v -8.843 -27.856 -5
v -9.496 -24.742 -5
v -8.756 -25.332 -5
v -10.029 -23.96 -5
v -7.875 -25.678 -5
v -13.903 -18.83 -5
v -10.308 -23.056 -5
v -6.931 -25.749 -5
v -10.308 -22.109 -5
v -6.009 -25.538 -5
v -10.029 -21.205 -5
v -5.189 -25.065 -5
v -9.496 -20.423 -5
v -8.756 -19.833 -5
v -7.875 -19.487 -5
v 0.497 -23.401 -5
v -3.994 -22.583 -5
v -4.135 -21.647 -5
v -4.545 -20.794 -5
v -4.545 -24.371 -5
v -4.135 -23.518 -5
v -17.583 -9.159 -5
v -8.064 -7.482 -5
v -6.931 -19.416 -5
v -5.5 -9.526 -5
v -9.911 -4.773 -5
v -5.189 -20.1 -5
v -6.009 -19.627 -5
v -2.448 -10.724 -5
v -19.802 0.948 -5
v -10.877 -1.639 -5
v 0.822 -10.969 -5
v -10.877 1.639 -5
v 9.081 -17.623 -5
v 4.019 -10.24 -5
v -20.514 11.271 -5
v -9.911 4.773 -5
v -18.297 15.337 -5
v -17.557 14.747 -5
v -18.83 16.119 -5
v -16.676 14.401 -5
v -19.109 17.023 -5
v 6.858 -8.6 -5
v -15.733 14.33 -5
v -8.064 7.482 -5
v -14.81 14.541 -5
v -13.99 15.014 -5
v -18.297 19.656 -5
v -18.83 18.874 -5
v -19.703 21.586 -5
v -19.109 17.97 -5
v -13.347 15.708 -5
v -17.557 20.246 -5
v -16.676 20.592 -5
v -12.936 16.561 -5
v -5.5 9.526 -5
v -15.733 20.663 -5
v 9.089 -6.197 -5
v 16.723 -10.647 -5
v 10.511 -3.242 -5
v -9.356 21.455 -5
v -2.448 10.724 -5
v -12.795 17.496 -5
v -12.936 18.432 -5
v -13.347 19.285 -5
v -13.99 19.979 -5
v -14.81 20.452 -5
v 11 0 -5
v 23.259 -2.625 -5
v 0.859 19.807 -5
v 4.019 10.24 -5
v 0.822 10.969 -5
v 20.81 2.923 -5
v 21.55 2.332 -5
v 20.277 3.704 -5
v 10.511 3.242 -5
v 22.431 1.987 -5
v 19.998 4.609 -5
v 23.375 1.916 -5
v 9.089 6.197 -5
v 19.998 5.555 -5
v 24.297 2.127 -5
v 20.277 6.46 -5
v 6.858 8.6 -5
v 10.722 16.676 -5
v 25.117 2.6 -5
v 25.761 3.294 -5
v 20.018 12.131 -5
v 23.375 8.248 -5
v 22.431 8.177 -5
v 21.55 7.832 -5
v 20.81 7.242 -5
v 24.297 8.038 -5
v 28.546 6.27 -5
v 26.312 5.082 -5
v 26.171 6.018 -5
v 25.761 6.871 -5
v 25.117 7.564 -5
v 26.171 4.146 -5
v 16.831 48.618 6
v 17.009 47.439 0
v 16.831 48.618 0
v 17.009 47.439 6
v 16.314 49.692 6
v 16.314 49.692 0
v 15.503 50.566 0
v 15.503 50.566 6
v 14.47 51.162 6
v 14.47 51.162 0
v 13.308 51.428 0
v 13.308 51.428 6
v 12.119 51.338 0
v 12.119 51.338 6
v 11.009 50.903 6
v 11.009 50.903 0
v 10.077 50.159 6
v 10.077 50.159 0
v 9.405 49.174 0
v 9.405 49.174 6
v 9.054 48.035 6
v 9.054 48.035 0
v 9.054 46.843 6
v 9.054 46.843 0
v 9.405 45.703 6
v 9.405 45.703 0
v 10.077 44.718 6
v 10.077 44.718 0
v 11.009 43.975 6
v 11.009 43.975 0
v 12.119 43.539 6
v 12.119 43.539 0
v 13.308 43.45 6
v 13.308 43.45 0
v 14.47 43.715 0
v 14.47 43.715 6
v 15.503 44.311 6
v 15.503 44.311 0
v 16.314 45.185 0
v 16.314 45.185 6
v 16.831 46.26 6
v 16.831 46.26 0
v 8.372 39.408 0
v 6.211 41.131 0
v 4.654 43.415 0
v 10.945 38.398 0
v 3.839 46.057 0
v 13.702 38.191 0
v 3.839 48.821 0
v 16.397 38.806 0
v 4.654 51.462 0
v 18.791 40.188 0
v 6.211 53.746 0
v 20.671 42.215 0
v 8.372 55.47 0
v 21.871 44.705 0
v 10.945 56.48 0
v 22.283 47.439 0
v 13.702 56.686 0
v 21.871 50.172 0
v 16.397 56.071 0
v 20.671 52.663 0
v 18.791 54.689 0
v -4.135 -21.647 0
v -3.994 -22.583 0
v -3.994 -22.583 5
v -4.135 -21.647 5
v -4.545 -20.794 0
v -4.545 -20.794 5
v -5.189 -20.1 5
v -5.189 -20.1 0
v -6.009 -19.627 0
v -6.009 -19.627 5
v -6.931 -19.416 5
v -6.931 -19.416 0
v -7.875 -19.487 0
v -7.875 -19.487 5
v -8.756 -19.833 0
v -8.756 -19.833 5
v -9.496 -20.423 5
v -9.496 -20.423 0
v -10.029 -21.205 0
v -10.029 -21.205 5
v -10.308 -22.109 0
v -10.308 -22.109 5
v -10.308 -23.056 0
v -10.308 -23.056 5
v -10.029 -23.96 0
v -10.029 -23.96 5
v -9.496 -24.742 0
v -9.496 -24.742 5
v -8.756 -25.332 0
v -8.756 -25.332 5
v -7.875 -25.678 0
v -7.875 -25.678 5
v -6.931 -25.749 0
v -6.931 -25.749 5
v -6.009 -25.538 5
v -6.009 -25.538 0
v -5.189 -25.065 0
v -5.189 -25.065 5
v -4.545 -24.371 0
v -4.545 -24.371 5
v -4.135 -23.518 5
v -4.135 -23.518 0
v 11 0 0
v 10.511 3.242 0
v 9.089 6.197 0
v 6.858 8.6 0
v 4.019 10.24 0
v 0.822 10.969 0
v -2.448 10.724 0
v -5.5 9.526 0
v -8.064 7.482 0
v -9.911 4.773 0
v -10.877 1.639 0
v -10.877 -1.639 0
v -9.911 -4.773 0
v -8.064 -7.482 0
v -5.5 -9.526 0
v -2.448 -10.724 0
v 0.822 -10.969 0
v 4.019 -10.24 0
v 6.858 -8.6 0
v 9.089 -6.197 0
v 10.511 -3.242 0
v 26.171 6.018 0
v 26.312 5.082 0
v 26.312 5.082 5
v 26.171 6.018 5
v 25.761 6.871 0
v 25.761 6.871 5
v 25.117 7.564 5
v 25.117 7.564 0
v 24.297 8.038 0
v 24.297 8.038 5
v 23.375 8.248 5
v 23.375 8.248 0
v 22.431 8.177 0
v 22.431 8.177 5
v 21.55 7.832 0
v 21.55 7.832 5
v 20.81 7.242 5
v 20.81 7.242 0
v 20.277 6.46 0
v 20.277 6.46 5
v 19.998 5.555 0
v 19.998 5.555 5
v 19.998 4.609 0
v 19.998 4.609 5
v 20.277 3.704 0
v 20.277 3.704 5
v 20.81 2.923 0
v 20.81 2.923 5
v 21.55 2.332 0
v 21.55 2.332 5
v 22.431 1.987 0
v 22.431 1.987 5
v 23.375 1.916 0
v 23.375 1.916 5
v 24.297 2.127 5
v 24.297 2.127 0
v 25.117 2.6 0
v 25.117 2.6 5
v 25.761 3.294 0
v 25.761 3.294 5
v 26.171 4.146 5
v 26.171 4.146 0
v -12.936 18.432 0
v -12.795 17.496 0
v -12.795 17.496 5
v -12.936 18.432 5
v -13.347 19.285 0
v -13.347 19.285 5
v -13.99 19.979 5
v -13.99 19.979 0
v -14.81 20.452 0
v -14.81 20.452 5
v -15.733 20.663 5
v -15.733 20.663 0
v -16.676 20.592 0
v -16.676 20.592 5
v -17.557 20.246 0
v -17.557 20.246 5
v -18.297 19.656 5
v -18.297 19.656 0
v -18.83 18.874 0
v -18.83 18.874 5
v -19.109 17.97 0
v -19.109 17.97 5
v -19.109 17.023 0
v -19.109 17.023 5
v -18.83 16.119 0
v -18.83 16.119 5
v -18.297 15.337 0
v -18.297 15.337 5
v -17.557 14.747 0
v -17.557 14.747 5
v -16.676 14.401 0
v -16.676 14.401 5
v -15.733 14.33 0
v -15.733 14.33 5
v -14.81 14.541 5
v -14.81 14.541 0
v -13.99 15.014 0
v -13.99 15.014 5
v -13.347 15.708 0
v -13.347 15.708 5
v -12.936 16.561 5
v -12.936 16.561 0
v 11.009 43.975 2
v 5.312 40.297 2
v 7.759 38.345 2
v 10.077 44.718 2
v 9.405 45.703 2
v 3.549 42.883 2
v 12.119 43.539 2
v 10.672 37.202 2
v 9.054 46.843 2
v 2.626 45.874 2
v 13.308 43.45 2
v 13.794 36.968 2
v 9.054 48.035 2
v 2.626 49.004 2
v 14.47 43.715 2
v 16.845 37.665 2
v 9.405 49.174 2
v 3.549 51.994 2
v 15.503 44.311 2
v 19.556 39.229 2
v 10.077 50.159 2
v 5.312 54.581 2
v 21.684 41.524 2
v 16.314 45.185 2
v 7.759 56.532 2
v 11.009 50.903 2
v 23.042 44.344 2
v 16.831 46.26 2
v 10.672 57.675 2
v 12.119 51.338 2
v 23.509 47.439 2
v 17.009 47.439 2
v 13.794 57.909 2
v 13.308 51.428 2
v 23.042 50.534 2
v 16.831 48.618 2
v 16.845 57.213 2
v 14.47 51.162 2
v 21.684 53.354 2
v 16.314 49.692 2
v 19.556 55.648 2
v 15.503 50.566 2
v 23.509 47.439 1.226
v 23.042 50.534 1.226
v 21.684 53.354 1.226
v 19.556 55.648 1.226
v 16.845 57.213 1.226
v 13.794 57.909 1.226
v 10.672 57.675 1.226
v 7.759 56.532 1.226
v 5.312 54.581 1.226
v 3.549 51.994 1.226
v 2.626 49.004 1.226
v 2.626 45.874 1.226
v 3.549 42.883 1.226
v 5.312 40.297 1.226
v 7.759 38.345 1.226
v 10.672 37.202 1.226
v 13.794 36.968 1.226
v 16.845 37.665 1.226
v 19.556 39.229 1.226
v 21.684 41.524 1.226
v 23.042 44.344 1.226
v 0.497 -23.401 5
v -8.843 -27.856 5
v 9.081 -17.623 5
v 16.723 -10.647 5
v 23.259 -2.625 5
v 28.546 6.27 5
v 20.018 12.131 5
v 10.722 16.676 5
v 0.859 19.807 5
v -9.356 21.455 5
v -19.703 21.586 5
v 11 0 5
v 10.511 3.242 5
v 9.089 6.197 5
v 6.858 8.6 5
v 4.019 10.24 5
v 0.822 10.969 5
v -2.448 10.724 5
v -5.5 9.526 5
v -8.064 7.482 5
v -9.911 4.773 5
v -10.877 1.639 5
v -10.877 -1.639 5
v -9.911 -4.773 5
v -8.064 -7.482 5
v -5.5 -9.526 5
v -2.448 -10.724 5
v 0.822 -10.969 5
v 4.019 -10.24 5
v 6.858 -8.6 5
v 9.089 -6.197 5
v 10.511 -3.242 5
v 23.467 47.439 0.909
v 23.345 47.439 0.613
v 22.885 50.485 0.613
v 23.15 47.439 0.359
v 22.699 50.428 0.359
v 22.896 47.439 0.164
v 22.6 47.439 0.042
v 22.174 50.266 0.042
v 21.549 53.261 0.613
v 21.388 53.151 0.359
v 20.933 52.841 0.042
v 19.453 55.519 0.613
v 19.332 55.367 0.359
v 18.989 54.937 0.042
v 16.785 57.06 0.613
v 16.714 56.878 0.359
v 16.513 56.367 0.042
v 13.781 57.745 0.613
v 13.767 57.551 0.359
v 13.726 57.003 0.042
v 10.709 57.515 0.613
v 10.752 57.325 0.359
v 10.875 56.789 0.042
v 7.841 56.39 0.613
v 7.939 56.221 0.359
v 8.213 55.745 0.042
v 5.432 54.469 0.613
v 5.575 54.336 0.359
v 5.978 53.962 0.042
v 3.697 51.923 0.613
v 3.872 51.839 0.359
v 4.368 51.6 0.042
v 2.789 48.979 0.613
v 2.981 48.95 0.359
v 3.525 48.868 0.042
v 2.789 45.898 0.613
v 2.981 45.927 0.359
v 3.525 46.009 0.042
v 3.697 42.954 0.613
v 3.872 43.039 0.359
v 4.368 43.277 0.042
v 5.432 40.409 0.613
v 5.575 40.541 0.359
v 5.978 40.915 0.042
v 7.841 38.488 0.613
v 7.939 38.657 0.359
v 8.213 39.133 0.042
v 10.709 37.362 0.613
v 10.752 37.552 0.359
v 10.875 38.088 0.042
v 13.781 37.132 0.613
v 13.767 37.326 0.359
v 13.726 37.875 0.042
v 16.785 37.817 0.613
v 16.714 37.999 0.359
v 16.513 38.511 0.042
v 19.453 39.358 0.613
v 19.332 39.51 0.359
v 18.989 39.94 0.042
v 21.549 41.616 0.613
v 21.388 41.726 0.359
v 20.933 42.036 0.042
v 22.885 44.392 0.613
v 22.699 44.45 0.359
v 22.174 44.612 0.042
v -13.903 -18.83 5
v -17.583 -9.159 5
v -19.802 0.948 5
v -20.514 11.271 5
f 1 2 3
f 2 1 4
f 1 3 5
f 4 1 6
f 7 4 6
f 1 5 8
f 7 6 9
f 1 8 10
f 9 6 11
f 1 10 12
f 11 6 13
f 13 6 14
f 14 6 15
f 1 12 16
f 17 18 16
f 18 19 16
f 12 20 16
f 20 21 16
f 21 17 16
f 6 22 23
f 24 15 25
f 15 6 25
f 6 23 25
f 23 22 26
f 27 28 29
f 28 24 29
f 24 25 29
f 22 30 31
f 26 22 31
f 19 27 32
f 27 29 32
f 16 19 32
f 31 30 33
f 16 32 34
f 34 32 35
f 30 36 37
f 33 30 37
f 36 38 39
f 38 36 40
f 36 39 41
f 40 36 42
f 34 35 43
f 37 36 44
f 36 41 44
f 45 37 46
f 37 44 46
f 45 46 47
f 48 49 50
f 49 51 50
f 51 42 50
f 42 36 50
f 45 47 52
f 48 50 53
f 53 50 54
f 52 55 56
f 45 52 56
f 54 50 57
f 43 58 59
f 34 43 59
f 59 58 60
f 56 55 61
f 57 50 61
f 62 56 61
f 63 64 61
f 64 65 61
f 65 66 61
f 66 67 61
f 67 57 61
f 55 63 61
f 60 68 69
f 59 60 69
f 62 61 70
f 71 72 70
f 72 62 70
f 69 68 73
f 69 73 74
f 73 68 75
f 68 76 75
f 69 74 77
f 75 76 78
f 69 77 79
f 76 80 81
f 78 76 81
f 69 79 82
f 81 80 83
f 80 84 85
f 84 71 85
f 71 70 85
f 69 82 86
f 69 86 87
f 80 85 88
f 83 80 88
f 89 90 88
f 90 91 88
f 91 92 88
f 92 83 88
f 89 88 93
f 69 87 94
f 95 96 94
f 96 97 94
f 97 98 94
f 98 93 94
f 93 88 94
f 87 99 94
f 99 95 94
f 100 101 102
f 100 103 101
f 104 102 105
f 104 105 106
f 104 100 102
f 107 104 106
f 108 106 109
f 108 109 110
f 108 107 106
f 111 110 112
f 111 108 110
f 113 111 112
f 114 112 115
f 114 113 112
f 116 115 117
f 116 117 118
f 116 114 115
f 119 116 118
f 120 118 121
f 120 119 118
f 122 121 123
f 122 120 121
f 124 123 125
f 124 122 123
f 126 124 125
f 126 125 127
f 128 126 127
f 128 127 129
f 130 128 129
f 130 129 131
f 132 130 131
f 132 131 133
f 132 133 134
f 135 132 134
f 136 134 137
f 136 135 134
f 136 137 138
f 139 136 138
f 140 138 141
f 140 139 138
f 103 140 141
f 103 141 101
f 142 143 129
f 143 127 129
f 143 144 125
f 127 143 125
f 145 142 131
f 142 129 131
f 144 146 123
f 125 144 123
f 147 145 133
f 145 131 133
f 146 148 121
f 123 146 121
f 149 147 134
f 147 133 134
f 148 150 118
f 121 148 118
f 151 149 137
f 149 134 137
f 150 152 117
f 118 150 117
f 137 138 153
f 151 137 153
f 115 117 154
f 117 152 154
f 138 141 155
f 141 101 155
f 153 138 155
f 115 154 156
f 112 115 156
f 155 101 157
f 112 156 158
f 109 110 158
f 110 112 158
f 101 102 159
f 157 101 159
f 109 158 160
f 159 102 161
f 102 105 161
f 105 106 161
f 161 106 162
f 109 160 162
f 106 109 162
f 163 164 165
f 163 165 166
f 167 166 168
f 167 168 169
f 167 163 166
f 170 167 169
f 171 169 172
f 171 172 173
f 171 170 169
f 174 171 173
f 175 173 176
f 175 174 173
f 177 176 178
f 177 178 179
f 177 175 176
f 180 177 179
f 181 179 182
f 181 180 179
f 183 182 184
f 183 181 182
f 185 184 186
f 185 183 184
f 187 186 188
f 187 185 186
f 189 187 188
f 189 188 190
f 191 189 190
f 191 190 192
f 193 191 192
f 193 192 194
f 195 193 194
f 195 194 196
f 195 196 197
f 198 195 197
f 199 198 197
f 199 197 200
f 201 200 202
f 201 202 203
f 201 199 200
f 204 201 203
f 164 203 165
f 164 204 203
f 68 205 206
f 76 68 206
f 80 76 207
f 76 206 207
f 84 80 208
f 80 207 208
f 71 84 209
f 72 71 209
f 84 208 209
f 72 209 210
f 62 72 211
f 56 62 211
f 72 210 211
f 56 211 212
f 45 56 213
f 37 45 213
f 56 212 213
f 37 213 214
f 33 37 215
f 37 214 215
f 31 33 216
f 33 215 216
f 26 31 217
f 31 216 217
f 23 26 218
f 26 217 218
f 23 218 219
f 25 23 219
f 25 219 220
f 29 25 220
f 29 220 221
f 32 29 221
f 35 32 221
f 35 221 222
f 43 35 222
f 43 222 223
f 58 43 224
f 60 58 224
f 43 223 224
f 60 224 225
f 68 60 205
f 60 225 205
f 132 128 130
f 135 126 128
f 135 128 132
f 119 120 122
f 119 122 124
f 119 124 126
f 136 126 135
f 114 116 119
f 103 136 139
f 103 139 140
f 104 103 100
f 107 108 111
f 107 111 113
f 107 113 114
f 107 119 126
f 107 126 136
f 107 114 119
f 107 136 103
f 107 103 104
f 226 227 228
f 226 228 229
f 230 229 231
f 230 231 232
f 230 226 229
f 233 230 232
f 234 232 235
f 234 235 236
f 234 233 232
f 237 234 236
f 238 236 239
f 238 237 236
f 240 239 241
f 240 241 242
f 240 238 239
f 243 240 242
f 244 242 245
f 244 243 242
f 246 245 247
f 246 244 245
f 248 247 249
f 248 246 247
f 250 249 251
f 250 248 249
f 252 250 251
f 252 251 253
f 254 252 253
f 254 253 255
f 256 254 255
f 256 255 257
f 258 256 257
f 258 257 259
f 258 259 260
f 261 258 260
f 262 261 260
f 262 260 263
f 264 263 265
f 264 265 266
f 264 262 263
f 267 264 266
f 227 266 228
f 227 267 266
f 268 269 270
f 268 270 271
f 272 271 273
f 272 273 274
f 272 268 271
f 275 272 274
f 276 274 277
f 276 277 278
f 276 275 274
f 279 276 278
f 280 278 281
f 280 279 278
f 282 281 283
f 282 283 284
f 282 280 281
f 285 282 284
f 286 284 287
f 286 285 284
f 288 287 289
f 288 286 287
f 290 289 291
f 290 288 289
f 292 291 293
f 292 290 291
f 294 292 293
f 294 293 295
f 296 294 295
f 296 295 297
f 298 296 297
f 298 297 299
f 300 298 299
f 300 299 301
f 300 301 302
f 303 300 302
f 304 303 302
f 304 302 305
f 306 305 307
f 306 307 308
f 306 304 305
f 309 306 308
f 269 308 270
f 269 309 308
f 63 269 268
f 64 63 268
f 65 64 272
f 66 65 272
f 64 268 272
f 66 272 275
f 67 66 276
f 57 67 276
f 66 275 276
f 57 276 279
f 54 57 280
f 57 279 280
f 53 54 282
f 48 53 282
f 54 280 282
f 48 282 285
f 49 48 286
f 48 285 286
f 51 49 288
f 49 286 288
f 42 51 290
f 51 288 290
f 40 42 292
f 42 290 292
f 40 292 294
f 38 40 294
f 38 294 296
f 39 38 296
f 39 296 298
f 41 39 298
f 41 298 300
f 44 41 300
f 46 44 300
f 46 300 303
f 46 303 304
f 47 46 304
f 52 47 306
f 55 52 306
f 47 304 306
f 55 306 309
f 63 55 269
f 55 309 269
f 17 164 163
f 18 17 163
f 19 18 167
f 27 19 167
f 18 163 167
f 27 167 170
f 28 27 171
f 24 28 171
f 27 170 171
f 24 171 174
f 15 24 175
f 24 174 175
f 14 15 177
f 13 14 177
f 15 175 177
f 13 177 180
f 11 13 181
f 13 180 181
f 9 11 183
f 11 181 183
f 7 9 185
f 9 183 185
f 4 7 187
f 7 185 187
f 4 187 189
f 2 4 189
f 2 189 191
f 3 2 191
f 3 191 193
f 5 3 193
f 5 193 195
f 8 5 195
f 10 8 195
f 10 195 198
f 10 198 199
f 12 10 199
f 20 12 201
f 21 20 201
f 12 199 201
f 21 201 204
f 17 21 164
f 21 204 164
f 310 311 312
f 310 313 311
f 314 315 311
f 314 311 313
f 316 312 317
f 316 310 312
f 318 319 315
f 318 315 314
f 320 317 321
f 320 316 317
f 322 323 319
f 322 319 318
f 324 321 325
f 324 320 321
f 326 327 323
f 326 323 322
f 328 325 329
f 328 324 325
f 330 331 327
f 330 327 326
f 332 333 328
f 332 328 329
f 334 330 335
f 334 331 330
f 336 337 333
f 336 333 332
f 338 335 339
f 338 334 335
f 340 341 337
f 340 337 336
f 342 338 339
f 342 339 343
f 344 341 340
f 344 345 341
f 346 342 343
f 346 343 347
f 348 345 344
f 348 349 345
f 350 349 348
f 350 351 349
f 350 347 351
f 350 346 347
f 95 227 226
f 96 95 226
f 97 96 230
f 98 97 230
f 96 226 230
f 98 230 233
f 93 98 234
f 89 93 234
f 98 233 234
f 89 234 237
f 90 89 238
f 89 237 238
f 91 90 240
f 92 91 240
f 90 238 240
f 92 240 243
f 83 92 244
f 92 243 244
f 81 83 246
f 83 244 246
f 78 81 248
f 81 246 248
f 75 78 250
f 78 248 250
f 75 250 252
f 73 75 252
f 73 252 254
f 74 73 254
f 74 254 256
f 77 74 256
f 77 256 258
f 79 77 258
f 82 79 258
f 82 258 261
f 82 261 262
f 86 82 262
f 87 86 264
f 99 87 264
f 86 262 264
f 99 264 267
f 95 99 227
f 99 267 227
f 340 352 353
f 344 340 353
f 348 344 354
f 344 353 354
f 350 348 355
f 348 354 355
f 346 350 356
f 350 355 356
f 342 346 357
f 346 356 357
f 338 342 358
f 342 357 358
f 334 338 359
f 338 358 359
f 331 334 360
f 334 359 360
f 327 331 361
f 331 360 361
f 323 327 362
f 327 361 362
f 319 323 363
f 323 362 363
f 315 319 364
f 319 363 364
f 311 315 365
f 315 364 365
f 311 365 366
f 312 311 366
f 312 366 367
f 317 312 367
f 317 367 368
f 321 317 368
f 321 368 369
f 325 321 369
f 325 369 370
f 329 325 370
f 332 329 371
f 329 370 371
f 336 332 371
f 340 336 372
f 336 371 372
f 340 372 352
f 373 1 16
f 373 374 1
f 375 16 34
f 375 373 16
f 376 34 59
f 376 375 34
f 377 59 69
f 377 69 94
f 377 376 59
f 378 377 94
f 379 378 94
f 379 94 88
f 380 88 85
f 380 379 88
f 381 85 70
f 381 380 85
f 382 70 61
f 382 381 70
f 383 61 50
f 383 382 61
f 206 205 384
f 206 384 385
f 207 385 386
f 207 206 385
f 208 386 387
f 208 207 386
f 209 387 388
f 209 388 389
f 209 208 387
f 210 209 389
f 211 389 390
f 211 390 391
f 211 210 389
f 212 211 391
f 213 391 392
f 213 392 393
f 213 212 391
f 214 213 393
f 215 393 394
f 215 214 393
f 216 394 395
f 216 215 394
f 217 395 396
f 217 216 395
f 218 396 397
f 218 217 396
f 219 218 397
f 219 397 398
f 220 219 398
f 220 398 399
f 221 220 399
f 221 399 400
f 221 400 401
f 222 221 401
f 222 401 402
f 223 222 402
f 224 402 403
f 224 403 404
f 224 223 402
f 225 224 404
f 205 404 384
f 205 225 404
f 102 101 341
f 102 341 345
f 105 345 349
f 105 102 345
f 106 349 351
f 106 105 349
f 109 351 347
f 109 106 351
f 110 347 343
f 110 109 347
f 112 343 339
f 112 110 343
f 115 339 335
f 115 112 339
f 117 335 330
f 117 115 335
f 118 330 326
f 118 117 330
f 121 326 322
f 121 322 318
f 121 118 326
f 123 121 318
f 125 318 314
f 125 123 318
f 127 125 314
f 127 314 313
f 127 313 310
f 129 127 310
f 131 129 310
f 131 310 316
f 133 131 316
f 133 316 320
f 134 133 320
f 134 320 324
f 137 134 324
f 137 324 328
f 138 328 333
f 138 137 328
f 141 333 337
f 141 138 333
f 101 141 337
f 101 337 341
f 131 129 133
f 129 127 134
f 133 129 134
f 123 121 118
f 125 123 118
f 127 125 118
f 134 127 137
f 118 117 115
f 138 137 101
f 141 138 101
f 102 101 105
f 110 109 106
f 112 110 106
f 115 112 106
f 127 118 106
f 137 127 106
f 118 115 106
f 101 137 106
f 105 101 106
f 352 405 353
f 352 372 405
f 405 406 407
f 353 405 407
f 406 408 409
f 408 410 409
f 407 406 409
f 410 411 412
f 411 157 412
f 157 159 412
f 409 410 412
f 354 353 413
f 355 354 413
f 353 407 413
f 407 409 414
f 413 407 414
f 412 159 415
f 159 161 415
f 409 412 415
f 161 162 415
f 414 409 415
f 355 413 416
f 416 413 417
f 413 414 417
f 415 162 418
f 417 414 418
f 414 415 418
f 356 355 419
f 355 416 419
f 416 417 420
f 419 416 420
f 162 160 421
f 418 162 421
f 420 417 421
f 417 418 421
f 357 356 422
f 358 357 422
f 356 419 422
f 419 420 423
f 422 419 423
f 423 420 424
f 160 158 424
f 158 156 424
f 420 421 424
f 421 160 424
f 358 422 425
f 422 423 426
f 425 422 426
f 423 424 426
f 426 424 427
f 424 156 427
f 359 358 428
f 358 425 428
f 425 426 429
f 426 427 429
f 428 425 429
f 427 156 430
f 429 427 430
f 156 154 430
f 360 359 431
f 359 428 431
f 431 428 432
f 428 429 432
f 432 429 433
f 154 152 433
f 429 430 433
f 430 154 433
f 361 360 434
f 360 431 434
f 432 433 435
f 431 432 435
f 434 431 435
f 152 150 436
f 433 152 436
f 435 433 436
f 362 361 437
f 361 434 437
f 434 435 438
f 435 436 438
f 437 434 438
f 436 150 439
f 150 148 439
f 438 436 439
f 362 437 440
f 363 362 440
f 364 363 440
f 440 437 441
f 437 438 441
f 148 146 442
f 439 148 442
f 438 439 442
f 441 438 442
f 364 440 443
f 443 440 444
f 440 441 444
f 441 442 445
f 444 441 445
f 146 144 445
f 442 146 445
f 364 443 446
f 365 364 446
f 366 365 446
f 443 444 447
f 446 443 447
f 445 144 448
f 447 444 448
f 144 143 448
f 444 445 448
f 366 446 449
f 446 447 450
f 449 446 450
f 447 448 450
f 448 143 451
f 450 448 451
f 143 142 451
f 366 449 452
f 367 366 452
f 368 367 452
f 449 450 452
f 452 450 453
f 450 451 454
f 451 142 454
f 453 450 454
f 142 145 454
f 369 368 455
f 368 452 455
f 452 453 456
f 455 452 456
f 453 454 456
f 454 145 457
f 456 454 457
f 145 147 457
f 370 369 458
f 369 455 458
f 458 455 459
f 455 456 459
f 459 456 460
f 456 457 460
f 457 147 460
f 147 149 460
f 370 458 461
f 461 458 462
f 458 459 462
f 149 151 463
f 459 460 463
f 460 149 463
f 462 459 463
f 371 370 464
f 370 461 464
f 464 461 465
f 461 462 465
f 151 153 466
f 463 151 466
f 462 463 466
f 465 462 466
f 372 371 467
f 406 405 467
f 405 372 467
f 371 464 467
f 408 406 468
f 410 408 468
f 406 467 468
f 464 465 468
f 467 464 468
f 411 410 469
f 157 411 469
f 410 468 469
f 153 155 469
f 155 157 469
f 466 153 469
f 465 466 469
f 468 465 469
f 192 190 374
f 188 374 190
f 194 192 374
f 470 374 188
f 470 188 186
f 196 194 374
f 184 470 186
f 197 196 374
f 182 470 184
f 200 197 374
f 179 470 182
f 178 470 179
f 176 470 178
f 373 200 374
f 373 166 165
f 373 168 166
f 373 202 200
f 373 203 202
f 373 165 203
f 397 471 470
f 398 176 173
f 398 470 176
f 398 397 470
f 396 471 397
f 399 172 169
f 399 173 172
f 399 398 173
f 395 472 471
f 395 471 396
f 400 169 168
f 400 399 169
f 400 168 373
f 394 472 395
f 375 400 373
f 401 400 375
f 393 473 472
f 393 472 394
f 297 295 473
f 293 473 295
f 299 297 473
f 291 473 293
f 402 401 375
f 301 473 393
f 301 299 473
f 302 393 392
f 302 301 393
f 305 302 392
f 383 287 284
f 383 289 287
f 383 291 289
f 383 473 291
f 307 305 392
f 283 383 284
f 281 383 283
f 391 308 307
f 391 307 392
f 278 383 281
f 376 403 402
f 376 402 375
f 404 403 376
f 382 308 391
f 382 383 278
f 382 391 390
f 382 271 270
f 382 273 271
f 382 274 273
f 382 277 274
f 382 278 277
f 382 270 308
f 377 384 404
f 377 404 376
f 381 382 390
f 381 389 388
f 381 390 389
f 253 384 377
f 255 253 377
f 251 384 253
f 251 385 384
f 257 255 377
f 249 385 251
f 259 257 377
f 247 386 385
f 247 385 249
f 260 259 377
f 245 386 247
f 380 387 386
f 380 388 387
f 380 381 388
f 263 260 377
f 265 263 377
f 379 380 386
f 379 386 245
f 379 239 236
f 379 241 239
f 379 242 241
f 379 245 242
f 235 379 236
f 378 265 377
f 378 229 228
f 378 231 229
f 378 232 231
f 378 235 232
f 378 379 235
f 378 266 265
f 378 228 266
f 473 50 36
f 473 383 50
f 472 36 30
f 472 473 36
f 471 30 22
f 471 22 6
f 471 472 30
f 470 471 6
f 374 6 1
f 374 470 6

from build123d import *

# Parameters (mm, degrees)
F0_R          = 3.175
F0_R_2        = 11
F1_DEPTH      = 5
F1_DEPTH_BACK = 5
F2_R          = 10.5
F2_R_2        = 4
F3_DEPTH      = 2
F4_R          = 4
F5_DEPTH      = 4
F5_DEPTH_BACK = 2
F6_R          = 1.2264204897


with BuildPart() as f1:
    # F0 (on Top) → F1 (new body, two sides)
    with BuildSketch(Plane.XY) as f1_sk:
        with BuildLine():
            ThreePointArc((-8.842844516, -27.8561878949), (13.0304821044, -14.2761270764), (28.5455886276, 6.2699659549))
            ThreePointArc((28.5455886276, 6.2699659549), (5.8482900848, 18.4229256967), (-19.7027441116, 21.5862219401))
            ThreePointArc((-19.7027441116, 21.5862219401), (-18.878729768, -4.1466649877), (-8.842844516, -27.8561878949))
        make_face()
        with Locations((-7.1687334744, -22.5825056938)):
            Circle(F0_R, mode=Mode.SUBTRACT)
        Circle(F0_R_2, mode=Mode.SUBTRACT)
        with Locations((-15.9698426708, 17.4964749218)):
            Circle(F0_R, mode=Mode.SUBTRACT)
        with Locations((23.1373130944, 5.0820519864)):
            Circle(F0_R, mode=Mode.SUBTRACT)
    extrude(amount=F1_DEPTH)
    extrude(f1_sk.sketch, amount=-F1_DEPTH_BACK)


with BuildPart() as f3:
    # F2 (on Top) → F3 (new body)
    with BuildSketch(Plane.XY):
        with Locations((13.008961454, 47.4386923015)):
            Circle(F2_R)
        with Locations((13.008961454, 47.4386923015)):
            Circle(F2_R_2, mode=Mode.SUBTRACT)
    extrude(amount=F3_DEPTH)

    # F6
    f6_edges = [f3.edges().sort_by_distance(p)[0] for p in [
        (2.508961, 47.438692, 0),
    ]]
    fillet(f6_edges, radius=F6_R)


with BuildPart() as f5:
    # F4 (on face) → F5 (new body, two sides)
    with BuildSketch(Plane.XY.offset(2)) as f5_sk:
        with Locations((13.008961454, 47.4386923015)):
            Circle(F4_R)
    extrude(amount=F5_DEPTH)
    extrude(f5_sk.sketch, amount=-F5_DEPTH_BACK)


solid = Compound([f1.part, f3.part, f5.part])
